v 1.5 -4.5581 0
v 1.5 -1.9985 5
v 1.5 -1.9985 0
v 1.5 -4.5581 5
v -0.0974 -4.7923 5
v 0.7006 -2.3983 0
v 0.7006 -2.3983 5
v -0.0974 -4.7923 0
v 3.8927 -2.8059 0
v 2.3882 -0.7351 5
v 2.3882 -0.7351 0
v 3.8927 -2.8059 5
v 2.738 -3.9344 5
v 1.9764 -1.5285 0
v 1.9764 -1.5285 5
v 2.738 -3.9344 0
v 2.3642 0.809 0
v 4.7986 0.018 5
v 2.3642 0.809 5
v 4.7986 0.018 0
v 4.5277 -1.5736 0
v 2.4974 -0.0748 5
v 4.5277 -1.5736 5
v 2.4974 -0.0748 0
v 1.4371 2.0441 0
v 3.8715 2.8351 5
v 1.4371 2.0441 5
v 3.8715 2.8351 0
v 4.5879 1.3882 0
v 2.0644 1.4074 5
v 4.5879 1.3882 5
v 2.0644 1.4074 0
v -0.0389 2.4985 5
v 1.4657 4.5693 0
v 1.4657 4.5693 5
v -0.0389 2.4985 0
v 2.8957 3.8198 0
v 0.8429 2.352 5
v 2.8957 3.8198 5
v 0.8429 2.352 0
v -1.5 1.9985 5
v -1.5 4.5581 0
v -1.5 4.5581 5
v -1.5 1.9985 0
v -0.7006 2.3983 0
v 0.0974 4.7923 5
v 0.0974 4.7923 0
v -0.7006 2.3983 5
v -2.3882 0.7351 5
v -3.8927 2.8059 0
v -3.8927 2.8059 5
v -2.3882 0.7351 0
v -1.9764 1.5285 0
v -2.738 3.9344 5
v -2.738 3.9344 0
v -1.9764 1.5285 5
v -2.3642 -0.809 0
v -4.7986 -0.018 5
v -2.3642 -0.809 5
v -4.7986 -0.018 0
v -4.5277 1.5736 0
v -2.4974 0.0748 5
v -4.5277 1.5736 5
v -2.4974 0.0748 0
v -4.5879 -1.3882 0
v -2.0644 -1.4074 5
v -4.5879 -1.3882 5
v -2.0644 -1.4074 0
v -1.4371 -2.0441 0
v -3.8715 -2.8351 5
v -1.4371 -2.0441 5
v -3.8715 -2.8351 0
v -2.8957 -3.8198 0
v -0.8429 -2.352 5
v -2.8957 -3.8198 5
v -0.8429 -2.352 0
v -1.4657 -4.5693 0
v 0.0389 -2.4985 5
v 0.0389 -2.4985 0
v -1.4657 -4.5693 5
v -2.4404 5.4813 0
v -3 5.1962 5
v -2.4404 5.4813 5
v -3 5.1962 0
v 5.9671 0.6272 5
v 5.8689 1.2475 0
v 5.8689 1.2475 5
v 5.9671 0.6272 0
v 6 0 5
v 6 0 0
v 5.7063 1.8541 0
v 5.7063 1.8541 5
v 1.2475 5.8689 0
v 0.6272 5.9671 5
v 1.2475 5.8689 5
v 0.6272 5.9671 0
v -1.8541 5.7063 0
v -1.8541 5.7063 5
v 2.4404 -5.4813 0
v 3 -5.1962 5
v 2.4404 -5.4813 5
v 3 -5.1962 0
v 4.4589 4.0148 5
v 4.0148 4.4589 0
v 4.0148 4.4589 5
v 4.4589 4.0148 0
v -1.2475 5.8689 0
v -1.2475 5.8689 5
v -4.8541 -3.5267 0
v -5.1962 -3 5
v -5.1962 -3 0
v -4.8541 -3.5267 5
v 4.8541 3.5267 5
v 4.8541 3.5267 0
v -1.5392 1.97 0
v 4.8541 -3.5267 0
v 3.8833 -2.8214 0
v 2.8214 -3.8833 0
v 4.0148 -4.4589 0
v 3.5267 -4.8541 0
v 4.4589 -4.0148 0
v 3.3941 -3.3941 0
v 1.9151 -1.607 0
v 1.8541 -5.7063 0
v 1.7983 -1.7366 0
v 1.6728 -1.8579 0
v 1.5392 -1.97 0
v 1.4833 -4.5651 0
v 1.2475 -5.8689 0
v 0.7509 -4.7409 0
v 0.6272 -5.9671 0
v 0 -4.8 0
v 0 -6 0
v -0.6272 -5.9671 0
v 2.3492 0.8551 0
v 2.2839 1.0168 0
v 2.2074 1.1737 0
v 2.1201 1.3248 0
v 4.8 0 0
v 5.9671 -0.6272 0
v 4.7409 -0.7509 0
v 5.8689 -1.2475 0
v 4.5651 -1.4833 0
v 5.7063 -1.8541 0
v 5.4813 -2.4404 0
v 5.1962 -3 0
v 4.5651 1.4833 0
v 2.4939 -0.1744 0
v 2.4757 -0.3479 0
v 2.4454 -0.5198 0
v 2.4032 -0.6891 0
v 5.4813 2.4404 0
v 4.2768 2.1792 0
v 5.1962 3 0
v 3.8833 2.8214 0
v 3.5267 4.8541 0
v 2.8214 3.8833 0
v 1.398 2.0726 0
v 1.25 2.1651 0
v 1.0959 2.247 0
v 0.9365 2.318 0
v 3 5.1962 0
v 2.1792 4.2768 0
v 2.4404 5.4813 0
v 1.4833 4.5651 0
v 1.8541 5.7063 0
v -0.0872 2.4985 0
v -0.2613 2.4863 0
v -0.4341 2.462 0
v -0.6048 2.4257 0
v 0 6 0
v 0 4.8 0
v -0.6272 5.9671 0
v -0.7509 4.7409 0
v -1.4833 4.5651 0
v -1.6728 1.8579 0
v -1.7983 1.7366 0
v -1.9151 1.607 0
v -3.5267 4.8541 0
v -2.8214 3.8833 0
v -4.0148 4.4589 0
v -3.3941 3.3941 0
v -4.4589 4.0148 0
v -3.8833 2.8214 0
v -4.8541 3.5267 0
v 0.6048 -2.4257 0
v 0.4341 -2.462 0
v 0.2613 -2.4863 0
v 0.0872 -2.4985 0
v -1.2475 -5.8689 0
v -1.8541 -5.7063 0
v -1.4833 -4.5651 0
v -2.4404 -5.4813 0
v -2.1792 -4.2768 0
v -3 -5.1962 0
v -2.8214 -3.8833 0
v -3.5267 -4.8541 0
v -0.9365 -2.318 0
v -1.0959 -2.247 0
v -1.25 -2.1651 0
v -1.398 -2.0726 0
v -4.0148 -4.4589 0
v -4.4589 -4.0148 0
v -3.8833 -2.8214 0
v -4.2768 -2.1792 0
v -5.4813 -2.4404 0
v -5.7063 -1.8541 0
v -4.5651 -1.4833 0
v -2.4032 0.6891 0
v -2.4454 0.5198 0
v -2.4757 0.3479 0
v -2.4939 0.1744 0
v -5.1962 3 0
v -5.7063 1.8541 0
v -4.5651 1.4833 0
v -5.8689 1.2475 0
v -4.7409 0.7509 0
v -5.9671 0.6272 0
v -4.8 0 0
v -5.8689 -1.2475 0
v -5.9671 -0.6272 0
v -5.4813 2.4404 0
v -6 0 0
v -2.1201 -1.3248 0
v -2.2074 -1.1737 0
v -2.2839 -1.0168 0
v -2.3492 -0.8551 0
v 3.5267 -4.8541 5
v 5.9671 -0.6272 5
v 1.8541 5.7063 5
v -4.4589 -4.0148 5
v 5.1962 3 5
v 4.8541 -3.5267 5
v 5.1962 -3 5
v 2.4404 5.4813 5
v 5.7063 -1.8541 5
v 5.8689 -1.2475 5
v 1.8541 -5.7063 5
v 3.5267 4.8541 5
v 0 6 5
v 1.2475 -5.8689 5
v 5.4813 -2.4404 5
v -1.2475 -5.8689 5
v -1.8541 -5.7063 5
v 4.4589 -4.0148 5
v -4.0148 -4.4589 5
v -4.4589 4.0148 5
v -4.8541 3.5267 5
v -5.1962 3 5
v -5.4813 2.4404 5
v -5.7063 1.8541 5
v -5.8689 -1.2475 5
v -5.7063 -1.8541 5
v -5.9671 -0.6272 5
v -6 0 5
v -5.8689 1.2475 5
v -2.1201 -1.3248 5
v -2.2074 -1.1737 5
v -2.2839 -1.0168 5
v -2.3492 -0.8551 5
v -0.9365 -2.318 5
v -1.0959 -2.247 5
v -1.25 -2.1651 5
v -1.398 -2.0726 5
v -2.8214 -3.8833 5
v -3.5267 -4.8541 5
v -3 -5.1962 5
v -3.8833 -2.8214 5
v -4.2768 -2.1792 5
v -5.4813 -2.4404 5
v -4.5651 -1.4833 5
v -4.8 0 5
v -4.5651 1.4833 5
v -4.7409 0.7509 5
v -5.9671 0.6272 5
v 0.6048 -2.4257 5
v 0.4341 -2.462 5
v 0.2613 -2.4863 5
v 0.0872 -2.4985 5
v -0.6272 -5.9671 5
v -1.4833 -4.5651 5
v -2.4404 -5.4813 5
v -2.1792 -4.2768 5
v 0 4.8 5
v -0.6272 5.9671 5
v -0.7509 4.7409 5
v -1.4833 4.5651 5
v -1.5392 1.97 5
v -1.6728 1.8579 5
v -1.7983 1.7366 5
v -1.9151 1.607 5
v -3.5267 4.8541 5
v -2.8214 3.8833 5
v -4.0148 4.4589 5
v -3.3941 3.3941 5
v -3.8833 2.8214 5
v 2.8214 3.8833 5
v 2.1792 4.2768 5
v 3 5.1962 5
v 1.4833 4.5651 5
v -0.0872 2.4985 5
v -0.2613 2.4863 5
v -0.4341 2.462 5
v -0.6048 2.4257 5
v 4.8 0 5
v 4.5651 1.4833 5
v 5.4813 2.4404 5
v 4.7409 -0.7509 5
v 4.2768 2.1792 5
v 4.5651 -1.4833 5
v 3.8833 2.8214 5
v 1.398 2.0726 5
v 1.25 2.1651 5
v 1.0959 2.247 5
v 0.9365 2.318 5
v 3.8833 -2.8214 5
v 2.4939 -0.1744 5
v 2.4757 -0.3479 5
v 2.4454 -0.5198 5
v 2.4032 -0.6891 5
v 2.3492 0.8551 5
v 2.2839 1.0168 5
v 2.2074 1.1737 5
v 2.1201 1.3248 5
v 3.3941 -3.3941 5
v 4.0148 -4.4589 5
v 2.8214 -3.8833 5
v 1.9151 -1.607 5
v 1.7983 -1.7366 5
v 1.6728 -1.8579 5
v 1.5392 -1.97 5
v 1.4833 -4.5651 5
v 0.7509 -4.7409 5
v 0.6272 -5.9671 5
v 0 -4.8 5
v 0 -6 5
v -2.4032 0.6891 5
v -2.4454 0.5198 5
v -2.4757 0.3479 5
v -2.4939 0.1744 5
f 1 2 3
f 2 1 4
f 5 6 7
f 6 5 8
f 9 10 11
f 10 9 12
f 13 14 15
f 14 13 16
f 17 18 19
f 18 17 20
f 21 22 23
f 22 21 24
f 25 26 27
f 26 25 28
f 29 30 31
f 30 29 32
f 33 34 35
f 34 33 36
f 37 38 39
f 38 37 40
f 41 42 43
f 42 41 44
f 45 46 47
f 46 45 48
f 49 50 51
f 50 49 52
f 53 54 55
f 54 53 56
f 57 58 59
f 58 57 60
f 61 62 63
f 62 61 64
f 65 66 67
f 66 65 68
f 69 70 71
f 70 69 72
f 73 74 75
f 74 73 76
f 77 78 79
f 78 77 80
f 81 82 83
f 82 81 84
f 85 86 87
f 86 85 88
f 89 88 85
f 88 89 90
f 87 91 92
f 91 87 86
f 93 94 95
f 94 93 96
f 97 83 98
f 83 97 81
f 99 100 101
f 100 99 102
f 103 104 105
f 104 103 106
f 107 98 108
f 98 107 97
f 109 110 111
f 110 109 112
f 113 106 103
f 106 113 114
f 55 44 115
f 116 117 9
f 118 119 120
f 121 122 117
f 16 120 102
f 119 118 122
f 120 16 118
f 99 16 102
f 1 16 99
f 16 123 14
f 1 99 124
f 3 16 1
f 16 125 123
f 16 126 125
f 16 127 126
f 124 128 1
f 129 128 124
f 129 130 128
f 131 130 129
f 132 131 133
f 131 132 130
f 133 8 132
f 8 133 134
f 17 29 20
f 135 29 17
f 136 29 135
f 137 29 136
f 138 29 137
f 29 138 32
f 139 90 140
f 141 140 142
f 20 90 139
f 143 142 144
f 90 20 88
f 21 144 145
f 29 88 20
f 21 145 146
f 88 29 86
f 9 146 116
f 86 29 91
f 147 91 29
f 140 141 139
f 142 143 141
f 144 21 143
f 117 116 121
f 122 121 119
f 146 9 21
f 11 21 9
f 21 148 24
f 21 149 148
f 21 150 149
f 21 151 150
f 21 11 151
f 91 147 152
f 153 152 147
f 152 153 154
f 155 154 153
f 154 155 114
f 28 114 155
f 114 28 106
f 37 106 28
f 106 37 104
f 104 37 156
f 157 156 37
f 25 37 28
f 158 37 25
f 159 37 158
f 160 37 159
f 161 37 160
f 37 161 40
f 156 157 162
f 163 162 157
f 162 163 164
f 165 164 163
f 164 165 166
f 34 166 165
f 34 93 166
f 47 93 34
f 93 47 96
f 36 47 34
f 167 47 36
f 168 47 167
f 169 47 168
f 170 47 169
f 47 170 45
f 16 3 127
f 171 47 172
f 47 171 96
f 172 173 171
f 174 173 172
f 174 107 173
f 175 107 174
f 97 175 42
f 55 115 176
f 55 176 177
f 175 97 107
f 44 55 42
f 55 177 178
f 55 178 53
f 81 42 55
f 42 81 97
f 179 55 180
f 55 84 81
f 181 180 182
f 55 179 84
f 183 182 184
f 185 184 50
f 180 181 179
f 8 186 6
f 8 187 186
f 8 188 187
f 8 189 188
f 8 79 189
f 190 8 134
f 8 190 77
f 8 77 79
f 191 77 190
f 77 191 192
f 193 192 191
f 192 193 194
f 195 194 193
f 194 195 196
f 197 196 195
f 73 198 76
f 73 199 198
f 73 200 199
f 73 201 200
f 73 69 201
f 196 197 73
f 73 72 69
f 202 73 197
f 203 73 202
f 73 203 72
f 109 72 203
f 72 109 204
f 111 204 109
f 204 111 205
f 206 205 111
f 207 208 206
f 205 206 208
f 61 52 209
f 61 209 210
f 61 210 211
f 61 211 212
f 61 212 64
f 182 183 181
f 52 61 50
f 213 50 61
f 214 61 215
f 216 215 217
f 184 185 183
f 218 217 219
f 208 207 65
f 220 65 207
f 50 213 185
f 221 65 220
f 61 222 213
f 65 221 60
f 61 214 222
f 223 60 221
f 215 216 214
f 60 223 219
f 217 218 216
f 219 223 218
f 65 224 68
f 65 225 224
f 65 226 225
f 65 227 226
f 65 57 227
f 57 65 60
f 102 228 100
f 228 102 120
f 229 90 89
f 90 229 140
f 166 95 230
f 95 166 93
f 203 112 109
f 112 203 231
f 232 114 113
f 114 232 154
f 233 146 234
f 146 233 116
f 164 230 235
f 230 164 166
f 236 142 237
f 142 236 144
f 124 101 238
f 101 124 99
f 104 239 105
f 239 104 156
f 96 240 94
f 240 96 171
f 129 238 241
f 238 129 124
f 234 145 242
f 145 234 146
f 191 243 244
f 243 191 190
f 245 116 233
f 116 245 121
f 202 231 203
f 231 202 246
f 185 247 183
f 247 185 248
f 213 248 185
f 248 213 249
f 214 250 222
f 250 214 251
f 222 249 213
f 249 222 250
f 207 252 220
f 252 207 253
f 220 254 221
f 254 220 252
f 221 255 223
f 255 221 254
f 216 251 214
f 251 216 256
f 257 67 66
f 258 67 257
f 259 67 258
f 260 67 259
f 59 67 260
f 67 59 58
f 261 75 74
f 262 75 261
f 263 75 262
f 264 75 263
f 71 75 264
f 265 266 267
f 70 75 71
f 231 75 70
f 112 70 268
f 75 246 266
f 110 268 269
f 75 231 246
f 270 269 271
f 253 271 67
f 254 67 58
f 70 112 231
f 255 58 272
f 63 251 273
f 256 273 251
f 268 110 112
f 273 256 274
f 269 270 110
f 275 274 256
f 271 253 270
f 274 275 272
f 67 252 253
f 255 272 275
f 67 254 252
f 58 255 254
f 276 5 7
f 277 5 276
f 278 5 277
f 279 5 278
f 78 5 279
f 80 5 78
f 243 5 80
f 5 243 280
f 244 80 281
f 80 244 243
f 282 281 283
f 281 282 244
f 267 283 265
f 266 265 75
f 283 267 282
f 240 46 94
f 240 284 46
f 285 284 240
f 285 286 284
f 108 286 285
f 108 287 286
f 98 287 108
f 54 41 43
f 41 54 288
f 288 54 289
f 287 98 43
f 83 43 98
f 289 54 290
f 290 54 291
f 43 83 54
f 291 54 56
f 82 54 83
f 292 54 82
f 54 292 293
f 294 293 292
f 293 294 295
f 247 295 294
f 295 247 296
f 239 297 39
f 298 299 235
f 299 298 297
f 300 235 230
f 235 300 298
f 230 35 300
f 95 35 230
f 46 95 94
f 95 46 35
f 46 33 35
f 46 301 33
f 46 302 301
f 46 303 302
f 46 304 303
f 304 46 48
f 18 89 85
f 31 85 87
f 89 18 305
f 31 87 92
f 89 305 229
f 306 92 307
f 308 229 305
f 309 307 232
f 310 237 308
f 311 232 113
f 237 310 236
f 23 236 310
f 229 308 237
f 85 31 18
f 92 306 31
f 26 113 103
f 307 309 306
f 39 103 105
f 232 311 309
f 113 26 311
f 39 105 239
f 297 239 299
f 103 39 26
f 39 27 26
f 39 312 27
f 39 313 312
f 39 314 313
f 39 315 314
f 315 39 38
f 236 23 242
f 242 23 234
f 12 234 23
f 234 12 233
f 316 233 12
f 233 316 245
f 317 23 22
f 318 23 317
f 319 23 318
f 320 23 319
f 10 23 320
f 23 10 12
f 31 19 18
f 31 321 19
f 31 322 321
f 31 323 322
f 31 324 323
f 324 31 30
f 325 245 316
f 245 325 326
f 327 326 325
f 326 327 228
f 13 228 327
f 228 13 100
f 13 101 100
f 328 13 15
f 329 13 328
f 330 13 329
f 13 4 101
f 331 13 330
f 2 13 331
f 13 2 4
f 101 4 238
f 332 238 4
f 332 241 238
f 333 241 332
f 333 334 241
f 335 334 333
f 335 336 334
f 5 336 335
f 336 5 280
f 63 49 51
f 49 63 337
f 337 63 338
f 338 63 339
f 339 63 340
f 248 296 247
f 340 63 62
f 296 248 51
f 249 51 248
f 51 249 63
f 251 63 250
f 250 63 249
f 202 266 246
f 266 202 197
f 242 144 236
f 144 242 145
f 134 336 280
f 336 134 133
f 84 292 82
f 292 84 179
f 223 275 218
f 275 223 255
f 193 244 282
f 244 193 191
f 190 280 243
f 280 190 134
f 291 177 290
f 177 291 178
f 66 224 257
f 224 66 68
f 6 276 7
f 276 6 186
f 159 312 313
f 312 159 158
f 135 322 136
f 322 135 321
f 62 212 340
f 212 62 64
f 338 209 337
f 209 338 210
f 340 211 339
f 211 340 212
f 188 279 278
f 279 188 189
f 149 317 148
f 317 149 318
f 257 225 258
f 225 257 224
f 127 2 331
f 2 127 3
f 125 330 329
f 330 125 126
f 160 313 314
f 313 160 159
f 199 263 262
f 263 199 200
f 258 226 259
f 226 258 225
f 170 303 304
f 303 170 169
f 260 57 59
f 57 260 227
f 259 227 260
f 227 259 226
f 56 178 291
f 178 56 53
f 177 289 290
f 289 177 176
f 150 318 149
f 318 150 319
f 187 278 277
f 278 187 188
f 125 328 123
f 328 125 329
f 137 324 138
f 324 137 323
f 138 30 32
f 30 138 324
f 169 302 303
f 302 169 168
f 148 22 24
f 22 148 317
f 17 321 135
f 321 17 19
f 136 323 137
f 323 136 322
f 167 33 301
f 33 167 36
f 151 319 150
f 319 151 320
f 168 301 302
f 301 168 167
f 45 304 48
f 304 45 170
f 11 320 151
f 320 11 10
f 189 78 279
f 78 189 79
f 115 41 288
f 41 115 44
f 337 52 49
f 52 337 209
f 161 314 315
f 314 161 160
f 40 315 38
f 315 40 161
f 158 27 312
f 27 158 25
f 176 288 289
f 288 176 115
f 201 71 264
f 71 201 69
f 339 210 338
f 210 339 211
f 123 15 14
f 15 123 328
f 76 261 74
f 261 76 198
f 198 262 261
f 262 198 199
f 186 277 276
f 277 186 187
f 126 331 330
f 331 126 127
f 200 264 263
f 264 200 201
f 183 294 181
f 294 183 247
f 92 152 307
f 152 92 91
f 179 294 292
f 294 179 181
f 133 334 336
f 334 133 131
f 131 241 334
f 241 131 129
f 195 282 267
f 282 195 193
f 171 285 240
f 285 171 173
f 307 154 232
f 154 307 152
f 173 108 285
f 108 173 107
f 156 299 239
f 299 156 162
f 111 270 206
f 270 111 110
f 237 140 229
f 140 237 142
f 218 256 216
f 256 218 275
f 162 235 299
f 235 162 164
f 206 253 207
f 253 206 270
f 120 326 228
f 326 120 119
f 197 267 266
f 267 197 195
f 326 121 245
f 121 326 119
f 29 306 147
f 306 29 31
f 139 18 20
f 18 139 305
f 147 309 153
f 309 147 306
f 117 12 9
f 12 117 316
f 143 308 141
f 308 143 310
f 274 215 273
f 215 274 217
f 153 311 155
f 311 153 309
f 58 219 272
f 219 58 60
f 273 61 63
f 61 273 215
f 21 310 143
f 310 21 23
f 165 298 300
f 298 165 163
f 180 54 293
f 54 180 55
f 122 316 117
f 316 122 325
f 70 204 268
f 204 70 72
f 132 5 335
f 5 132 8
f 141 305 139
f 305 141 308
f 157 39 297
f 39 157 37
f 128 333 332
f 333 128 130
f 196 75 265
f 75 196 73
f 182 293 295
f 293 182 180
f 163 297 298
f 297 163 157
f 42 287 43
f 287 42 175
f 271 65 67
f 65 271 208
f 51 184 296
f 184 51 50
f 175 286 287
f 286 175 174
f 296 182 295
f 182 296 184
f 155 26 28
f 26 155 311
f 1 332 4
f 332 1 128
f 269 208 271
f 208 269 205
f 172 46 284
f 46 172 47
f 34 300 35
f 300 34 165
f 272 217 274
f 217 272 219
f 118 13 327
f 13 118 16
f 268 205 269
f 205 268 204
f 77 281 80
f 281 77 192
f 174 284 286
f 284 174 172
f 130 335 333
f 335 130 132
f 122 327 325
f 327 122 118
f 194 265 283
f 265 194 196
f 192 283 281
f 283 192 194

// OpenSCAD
nbolts=[3,6,9];
dbolts=30;
function bpos(i)=let(a=360/12*i)dbolts/2*[cos(a),sin(a),0];
bolts=[for(j=nbolts) bpos(j)];
dbearings=12;

module mountplate()
{
    h=7;
    core=50;
    bara=9;
    bpos=core/2-bara/2-1.5;
    module b() rotate([0,90,0])cylinder(d=bara,h=5,center=true);
    difference() {
        color("pink")translate([0,0,-h]) cylinder(d=core,h=h);
        translate([0,0,-h-1]) cylinder(d=25,h=h+2);
        for(i=[0:12]) translate(bpos(i)-[0,0,7+.5])
            cylinder(d=3.5,h=7+1,$fn=12);
        }
    color("pink") rotate([0,0,360/24])
    for(i=[bpos,-bpos]) translate([0,i,0]) b();
}

module prism(l, w, h) {
       polyhedron(points=[
               [0,0,h],           // 0    front top corner
               [0,0,0],[w,0,0],   // 1, 2 front left & right bottom corners
               [0,l,h],           // 3    back top corner
               [0,l,0],[w,l,0]    // 4, 5 back left & right bottom corners
       ], faces=[ // points for all faces must be ordered clockwise when looking in
               [0,2,1],    // top face
               [3,4,5],    // base face
               [0,1,4,3],  // h face
               [1,2,5,4],  // w face
               [0,3,5,2],  // hypotenuse face
       ]);
}

module vprism(l,w,h) {
    rotate([90,0,180])
    translate([0,0,-h]) prism(l,w,h);
}

                        
module bearing(d1=dbearings,d2=5.0,h=5)
{
    teeth=10;
    extruder=.4;
    perimeters=5;
    difference() {
        cylinder(d=d1,h=h,$fn=60);
        translate([0,0,-1])cylinder(d=d2,h=h+2,$fn=90);
        for(t = [0 : teeth - 1])
            rotate([0, 0, 360 / teeth * t]) {
                translate([d1/8,0,-1]) 
                    vprism(h+2, extruder * perimeters, d1 / 2);
            }
    }
    difference() {
        cylinder(d=d1,h=h,$fn=60);
        translate([0,0,-1])cylinder(r=d1/2-.4*3,h=h+2,$fn=40);
    }
}

module bearings()
{
    for(i=bolts) translate(i) bearing();
}

module support(htotal=30,hmnt=5)
{
    mntsz=35;
    dpen=10.6;
    tol=0.3;
    dbox=17;
    box=[dbox,20,0];
    hbox=7;
    gap=1;

    module frame() {
        //cylinder(d=mntsz,h=hmnt,$fn=80);
        for(b=bolts) hull() {
            //translate(-box/2)cube(box+[0,0,hmnt]);
            cylinder(d=dbox,h=hmnt);
            translate(b) cylinder(d=dbearings-1,h=hmnt);
        }
        cylinder(d=dbox,h=htotal);
        hull() {
            translate(-box/2+[0,0,htotal-hbox])cube(box+[0,0,hbox]);
            translate([0,0,htotal-hbox*2])cylinder(d=dbox,h=hbox*2);
        }
    }
    
    module cuts() {
        boxgap=[gap,box.y+1,0];
        ypos=(dpen/2+box.y/2)/2;
        translate([0,0,hmnt*1.5]-boxgap/2) cube(boxgap+[0,0,htotal]);
        translate([0,0,-.5]) cylinder(d=dpen+tol,h=htotal+1,$fn=50);
        for(d=[-ypos,ypos])translate([0,d,htotal-hbox/2])
            rotate([0,90,0]) cylinder(d=3.5,h=box.x+1,center=true,$fn=20);
        for(i=bolts) translate(i-[0,0,1]) {
            cylinder(d=dbearings+tol,h=hmnt+2,$fn=44);
            rotate_extrude($fn=40) translate([dbearings/2+1.5,1+hmnt/2-3.2/2,0])
                square([1,3.2]);
        }
    }
    
    difference() {
        frame();
        cuts();
    }
    
}

bearing();
//rotate([0,0,360/12]*-2)mountplate();
//for(i=bolts) translate(i) cylinder(d=5,h=20,$fn=22);
//bearings();
///support();
